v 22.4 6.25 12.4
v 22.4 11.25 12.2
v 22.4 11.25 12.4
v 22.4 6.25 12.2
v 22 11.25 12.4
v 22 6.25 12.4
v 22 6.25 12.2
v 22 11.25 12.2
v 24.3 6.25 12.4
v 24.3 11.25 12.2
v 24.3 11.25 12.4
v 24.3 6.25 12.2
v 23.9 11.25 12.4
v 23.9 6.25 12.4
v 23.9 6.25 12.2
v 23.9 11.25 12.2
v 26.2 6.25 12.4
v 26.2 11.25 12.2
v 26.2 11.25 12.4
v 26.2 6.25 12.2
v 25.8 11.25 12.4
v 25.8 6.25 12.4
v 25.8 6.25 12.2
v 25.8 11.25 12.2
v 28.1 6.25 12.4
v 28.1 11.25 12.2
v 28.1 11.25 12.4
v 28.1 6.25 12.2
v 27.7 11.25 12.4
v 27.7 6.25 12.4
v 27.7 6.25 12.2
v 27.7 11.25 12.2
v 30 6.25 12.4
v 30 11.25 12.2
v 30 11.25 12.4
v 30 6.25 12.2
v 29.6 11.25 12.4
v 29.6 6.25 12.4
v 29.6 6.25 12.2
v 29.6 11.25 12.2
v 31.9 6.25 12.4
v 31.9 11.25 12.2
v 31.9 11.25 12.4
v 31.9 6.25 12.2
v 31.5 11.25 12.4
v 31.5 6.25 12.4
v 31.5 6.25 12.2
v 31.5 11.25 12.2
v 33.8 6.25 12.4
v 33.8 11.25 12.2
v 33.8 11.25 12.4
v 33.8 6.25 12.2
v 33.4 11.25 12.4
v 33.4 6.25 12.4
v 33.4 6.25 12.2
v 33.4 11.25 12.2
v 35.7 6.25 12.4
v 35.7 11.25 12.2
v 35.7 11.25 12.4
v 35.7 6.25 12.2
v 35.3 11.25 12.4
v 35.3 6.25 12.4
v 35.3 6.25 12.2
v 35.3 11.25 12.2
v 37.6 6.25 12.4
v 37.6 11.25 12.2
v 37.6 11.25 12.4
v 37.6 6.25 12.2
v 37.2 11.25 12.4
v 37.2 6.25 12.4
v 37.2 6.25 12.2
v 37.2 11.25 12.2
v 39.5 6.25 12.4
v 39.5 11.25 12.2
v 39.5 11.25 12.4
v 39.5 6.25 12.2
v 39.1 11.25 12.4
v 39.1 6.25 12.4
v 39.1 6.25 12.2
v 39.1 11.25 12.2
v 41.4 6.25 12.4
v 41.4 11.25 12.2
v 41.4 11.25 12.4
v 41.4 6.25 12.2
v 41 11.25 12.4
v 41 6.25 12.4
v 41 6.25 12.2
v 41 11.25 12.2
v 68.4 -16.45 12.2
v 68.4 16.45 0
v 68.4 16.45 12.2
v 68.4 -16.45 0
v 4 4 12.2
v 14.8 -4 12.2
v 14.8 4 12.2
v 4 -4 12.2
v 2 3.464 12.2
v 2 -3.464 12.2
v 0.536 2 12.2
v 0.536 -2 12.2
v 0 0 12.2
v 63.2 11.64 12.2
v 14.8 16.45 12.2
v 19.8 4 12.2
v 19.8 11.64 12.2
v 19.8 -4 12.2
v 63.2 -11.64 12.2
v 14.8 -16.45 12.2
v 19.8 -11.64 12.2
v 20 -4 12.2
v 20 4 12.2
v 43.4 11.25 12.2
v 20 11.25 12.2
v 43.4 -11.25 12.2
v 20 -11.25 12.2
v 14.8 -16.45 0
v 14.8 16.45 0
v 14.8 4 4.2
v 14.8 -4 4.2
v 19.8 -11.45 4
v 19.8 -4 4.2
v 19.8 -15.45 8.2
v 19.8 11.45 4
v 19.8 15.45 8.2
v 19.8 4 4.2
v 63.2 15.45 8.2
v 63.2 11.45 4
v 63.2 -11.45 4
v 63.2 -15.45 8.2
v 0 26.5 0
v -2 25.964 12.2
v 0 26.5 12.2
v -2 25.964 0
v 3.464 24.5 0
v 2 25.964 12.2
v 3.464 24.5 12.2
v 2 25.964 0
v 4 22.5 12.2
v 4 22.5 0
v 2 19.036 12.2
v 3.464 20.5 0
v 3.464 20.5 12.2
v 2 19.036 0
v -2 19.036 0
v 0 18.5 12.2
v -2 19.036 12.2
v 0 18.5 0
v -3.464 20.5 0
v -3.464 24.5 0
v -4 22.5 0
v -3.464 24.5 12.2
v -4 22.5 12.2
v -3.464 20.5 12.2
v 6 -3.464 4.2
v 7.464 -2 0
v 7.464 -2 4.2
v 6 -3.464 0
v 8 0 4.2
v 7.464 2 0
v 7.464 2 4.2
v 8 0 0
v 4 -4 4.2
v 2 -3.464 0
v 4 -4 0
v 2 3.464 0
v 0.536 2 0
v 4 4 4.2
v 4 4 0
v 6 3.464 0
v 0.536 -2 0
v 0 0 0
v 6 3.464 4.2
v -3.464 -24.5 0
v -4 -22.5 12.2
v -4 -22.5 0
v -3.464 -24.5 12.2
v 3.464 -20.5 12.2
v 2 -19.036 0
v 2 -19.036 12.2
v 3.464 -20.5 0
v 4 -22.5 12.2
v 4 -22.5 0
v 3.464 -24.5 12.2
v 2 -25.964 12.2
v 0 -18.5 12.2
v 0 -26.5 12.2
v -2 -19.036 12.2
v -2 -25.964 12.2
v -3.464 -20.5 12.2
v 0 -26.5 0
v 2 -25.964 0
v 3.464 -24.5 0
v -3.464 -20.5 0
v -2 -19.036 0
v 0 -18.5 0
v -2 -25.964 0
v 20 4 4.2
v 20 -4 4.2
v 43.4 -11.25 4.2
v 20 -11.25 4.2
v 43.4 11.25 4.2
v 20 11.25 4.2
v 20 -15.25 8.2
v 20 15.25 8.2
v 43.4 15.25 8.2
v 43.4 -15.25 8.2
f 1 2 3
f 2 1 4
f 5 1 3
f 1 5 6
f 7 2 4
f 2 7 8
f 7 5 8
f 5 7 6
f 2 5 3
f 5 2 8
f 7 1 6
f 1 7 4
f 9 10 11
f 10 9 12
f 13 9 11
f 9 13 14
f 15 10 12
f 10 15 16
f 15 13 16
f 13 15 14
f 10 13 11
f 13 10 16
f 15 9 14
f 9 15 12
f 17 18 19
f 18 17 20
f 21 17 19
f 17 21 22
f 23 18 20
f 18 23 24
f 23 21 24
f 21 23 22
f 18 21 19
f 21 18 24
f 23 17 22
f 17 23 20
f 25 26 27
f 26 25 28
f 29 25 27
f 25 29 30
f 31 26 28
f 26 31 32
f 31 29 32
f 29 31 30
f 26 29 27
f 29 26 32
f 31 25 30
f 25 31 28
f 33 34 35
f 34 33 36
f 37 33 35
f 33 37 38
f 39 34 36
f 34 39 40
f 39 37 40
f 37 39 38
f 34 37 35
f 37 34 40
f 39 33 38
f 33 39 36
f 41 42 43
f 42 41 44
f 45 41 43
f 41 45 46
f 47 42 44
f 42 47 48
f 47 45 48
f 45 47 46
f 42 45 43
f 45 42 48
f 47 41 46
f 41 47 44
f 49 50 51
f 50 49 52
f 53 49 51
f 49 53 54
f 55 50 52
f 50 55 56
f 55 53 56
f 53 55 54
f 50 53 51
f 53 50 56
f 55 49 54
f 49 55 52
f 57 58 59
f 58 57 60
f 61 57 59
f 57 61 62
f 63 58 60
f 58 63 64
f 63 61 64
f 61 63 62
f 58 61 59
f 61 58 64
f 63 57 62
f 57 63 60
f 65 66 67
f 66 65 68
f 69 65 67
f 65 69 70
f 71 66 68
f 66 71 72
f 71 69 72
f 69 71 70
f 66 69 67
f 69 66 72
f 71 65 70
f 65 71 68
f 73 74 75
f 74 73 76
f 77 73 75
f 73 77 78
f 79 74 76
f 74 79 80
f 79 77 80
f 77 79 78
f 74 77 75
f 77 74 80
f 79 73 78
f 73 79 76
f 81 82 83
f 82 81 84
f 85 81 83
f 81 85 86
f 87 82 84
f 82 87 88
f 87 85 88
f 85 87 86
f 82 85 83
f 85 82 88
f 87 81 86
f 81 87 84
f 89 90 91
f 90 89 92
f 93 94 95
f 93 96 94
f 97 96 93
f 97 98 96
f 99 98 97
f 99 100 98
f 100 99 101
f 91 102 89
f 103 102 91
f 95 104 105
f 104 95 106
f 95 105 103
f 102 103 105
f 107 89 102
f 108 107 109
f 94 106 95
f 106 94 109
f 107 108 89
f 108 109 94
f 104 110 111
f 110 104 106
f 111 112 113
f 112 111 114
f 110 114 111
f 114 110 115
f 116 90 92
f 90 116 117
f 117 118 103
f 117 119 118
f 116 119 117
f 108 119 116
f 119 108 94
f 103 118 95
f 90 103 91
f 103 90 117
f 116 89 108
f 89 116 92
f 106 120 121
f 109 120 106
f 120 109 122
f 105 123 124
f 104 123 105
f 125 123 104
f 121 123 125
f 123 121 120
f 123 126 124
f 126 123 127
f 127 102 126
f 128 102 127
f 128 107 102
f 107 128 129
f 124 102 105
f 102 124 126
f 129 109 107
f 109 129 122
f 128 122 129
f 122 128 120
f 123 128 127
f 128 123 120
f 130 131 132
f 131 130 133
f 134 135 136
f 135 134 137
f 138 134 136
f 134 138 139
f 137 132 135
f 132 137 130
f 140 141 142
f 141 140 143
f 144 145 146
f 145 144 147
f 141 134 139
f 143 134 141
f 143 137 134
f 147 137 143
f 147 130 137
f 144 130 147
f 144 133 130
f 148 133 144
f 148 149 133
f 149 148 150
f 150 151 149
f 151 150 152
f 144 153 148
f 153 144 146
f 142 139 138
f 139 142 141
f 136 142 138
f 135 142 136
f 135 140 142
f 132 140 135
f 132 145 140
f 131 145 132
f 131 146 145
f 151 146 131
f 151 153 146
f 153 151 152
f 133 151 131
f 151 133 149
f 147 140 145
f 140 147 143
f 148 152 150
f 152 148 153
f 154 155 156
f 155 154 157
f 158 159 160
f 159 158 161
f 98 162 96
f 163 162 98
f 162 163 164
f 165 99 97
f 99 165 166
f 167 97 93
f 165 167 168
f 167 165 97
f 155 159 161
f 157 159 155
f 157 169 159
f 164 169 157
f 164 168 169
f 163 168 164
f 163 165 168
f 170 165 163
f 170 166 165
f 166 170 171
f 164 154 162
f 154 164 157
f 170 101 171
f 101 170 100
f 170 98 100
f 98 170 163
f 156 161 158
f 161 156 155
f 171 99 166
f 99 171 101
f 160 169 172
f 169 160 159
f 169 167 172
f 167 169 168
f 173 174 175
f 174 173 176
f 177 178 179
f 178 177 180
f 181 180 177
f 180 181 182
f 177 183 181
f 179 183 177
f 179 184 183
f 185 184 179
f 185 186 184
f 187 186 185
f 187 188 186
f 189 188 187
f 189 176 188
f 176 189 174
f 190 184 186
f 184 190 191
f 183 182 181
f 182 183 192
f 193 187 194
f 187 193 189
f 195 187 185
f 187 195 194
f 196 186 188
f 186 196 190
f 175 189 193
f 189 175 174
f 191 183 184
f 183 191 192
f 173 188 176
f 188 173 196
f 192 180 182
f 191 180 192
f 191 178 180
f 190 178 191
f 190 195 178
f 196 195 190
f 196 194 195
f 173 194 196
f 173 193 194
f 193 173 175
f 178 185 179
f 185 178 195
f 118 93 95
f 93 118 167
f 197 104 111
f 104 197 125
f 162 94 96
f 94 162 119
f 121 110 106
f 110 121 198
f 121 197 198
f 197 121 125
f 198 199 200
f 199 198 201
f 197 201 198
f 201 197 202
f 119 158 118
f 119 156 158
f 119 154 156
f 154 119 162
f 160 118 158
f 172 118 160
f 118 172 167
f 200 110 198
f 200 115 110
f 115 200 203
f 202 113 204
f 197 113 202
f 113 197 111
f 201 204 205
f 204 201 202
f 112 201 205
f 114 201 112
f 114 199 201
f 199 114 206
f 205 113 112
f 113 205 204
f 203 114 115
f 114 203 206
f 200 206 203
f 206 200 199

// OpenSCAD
/*[Pegs]*/
peg_diameter = 8;
peg_resolution = 12;
peg_distance = 45;
peg_overlap = 50;
belt_width = 8;

/*[Case]*/
base_height = 4;
max_overhang_angle = 45;
tolerance = 0.2;
nozzle_diameter = 0.4;
layer_height = 0.2;
border_width = 5;

/*[Spring]*/
amplitude = 7.5;
// 1 pulse is half a wavelength
pulse_length = 5;
number_of_pulses = 2;
spring_perimeters = 2;
spring_connection_length = 5;

/*[Vernier]*/
rule_margin = 2;
rule_spacing = 1;
type = "standart";
number_of_subdivisions = 10;

_height = belt_width + base_height + layer_height;
_vernier_length = (2 * number_of_subdivisions - 1) * rule_spacing;

//bottom cylinder
module peg(x=0, y=0, z=0, rot = 0) {
    translate([x, y, z])
    rotate([0, 0, rot])
    cylinder(_height, d = peg_diameter, $fn=peg_resolution);
}

//middle cylinder bridge
module bridge() {
    translate([0.01 * (100 - peg_overlap) * peg_diameter, 0, base_height + layer_height])
    hull() {
        rotate([0, 0, 180])
        cylinder(belt_width, d = peg_diameter, $fn=peg_resolution);
    
        translate([0.01 * (150 + peg_overlap) * peg_diameter, 0, 0])
        rotate([0, 0, 180])
        cylinder(belt_width, d = peg_diameter, $fn=peg_resolution);
    }
}

//spring guide
a = 1.5 * amplitude;
w = 0.5 * belt_width / tan(max_overhang_angle);

translate([2.5 * peg_diameter, 0, base_height + layer_height])
rotate([0, 90, 0])
linear_extrude(_vernier_length + 2 * rule_margin + nozzle_diameter)
polygon([[0, a], [-0.5 * belt_width, a+w], [-belt_width, a], [-belt_width, -a], [-0.5 * belt_width, -a - w], [0, -a]]);

//vernier scale
translate([2.5 * peg_diameter + rule_margin, a - 5, _height])
for (i = [0 : 1 : 10]){
    translate([i * _vernier_length / number_of_subdivisions, 0, 0])
    cube([nozzle_diameter, 5, layer_height]);
}

//case
translate([2.5 * peg_diameter - border_width - tolerance, 0, 0])
difference() {
    translate([0, -a - tolerance - border_width, 0])
    cube([_vernier_length + 2 * (rule_margin + border_width + spring_connection_length) + nozzle_diameter + pulse_length * number_of_pulses + tolerance, 2 * (a + tolerance + border_width), _height]);
    
    translate([border_width, 0, base_height + layer_height])
    rotate([0, 90, 0])
    linear_extrude(_vernier_length + 2 * (rule_margin + spring_connection_length) + nozzle_diameter + pulse_length * number_of_pulses)
    polygon([
        [layer_height, a + tolerance],
        [-0.5 * belt_width, a+w+tolerance],
        [-belt_width - layer_height, a+tolerance],
        [-belt_width - layer_height, -a-tolerance],
        [-0.5 * belt_width, -a - w-tolerance],
        [layer_height, -a-tolerance]
    ]);
}

module belt_tension_meter(){
    union() {
        // top peg
        peg(y = 0.5 * peg_distance);
        
        // middle peg
        peg(x = 0.01 * (100 - peg_overlap) * peg_diameter, rot = 180);
        
        // bottom cylinder
        peg(y = -0.5 * peg_distance);
        
        // bridge
        bridge();
    }
}

belt_tension_meter();
